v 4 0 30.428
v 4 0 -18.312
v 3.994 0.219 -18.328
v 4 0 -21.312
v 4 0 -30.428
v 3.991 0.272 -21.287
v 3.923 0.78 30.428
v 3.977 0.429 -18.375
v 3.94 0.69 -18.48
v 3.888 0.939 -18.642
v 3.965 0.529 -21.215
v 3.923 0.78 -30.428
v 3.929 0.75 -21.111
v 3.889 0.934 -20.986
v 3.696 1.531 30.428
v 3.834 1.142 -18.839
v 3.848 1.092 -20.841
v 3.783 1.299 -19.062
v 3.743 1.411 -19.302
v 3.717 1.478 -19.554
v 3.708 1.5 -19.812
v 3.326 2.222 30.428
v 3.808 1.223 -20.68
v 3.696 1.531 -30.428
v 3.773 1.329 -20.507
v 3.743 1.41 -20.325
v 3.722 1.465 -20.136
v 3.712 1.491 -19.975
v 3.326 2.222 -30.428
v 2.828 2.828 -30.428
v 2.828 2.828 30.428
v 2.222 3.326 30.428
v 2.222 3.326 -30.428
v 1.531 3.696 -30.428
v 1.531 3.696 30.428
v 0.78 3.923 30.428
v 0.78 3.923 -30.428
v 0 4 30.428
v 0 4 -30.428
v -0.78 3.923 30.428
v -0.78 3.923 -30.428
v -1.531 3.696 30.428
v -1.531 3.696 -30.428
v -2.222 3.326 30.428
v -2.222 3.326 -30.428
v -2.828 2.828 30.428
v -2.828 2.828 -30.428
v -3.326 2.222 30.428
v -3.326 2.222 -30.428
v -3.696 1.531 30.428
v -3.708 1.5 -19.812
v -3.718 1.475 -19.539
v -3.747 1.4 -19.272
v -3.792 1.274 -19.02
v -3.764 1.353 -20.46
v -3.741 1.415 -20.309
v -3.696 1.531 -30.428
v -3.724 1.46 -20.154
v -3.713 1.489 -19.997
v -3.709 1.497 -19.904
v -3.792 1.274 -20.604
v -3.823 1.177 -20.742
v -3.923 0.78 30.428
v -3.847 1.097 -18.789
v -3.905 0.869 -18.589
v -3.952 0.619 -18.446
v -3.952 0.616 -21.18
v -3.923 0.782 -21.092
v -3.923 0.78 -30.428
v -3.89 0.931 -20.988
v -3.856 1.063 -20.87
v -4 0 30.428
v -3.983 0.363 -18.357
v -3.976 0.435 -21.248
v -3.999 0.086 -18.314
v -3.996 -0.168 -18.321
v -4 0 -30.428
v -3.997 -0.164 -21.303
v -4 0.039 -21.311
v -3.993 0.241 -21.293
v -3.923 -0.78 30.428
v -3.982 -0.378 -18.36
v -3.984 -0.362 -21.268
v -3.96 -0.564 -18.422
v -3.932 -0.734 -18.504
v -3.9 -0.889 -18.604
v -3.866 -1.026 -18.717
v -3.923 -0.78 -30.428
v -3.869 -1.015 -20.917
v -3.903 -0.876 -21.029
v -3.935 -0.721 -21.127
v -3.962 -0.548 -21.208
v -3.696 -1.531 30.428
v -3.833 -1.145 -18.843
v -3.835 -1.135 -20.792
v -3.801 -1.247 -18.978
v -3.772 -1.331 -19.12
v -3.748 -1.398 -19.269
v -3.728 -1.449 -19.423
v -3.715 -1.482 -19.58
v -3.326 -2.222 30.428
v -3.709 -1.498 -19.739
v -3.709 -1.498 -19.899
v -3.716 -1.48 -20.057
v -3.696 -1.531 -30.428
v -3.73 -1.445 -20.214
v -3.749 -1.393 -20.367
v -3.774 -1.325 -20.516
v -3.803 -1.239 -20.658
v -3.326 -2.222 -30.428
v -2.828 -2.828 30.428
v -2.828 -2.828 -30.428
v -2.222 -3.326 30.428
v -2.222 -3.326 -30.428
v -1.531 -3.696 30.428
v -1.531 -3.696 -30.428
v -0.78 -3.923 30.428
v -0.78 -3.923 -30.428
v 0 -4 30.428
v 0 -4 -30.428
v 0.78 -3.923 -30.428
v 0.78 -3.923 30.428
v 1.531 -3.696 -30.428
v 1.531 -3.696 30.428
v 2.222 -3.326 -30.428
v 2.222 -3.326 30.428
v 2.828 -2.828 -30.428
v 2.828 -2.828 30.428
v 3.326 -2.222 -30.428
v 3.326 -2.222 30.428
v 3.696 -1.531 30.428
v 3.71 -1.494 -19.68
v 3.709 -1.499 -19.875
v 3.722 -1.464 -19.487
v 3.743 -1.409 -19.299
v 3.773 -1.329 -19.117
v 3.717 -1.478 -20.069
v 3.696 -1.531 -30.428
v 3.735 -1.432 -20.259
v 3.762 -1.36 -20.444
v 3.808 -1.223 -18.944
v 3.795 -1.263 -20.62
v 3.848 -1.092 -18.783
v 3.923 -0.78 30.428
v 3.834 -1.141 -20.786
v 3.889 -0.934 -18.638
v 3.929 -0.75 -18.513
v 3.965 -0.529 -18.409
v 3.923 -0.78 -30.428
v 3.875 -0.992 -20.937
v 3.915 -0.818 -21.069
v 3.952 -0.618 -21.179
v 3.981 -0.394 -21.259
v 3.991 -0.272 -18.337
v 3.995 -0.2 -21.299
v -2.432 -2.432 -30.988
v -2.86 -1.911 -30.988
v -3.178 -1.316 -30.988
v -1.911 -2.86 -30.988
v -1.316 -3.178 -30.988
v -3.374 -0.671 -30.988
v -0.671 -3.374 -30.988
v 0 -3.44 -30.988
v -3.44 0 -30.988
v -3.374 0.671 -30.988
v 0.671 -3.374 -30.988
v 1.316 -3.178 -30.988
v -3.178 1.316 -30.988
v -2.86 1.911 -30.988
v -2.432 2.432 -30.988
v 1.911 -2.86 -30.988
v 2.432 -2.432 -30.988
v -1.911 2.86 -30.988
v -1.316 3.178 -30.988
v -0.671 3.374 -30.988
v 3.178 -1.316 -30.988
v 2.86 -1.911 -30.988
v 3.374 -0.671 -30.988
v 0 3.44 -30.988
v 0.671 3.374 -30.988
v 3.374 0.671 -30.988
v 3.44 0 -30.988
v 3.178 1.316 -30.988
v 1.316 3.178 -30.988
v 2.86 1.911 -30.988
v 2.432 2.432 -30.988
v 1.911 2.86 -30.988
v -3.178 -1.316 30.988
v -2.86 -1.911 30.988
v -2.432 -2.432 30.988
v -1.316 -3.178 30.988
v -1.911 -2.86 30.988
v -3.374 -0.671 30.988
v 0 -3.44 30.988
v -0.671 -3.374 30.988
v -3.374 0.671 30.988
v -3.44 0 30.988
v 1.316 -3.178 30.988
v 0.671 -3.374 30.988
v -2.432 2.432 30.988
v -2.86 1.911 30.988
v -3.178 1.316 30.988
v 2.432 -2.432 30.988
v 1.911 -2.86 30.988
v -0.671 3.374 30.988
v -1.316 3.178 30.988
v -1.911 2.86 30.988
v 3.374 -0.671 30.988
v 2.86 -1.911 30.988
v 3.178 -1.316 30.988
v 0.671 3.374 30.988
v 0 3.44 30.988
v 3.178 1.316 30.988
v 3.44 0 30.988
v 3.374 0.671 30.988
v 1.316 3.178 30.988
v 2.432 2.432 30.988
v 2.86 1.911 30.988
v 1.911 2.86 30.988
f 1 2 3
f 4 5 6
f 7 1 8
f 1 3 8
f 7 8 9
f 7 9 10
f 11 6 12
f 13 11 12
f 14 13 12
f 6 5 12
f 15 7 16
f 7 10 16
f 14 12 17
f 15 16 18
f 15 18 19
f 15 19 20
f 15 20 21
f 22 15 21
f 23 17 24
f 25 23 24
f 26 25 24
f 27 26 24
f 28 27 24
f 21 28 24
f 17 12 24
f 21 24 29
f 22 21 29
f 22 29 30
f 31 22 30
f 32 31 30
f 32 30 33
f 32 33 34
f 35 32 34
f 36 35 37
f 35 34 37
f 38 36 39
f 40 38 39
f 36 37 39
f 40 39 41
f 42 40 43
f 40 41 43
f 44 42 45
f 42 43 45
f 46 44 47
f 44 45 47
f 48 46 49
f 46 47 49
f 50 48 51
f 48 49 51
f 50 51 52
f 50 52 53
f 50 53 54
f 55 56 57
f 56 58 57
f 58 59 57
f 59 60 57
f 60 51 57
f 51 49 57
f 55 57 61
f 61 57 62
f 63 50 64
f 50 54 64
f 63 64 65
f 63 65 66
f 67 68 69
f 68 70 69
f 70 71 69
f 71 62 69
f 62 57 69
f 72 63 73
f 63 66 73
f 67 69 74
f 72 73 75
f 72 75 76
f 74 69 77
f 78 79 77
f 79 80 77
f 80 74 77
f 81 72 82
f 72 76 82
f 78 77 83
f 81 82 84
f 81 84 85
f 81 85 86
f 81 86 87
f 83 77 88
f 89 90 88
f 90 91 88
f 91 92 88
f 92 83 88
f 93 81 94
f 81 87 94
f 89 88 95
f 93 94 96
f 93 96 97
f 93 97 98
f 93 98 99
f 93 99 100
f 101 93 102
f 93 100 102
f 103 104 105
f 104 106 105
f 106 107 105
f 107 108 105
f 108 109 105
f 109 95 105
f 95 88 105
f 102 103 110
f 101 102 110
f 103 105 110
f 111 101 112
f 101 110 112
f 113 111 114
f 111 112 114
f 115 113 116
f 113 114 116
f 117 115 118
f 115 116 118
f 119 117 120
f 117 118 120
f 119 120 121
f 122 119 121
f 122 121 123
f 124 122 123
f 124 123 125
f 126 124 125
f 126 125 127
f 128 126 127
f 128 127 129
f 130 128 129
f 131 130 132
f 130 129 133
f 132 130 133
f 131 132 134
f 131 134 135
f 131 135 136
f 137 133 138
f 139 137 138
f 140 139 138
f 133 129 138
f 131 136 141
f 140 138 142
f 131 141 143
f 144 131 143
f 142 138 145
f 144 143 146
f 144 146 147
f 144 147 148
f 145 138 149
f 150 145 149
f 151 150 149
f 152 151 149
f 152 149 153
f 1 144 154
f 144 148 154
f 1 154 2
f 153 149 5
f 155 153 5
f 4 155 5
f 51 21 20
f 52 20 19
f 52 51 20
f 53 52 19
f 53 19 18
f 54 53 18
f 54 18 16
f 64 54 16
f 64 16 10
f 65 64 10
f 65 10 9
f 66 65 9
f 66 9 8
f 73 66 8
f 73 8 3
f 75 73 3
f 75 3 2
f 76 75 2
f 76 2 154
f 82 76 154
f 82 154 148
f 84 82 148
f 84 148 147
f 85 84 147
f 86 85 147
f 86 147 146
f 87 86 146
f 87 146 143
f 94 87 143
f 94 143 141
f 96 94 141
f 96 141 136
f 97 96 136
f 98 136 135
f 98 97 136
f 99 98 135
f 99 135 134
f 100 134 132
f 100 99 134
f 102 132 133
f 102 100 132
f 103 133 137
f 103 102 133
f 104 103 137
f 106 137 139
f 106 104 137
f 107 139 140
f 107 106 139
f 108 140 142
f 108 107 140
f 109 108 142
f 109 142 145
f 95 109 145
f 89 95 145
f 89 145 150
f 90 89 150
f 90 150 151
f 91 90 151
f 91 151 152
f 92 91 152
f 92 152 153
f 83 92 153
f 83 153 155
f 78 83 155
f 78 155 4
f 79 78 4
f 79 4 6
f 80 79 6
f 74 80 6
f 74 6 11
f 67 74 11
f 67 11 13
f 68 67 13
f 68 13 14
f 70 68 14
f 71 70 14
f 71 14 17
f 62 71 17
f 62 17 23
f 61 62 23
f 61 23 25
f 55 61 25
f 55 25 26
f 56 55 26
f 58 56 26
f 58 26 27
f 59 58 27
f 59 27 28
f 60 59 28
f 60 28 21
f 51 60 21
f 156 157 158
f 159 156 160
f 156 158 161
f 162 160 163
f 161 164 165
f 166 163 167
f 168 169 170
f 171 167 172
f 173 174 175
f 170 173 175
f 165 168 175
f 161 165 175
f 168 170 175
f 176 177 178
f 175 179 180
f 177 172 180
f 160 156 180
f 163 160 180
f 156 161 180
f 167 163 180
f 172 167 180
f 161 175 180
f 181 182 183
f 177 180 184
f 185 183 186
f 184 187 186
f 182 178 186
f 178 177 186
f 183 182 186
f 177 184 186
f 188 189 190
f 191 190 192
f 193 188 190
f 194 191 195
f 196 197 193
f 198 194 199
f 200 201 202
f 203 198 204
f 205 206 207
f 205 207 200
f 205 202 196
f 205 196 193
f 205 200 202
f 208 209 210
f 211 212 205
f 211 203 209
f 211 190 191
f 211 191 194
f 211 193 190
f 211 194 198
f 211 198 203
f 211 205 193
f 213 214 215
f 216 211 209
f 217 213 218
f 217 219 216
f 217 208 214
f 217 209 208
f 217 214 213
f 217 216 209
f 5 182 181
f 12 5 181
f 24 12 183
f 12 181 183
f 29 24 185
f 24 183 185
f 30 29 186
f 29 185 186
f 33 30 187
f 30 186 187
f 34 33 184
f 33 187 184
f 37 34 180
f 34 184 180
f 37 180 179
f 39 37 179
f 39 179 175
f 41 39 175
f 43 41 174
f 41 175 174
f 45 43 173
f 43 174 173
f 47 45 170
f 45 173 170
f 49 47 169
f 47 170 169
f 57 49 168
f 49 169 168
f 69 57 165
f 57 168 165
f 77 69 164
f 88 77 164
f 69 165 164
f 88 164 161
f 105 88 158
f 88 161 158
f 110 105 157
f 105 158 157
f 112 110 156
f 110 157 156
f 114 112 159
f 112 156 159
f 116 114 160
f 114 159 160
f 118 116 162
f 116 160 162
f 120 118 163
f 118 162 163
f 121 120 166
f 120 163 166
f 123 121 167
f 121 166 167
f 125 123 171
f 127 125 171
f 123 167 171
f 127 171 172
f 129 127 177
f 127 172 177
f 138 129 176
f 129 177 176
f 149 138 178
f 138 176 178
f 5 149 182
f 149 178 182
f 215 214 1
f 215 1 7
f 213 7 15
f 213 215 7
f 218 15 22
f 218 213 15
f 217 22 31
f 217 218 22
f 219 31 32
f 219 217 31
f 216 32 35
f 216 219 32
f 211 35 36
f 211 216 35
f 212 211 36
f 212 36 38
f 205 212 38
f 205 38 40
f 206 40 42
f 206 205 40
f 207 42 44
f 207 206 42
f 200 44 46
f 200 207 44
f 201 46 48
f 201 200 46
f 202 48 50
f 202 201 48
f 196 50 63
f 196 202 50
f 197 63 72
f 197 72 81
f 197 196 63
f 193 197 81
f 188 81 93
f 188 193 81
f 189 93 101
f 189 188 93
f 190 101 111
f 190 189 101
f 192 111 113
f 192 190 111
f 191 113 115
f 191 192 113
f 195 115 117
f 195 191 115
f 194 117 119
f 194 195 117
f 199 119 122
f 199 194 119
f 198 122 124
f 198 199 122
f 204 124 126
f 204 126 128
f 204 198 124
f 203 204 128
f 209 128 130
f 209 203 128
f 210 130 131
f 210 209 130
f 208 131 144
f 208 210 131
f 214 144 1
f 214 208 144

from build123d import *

# Parameters (mm, degrees)
BOSS_EXTRUDE1_DEPTH      = 30.988
BOSS_EXTRUDE1_DEPTH_BACK = 30.988
SKETCH1_R                = 4
CUT_EXTRUDE1_START       = -4.000000101
CUT_EXTRUDE1_OUTLINE_R   = 1.500000048
CUT_EXTRUDE1_DEPTH       = 8.000000202
CHAMFER1_SIZE            = 0.56


# Read off the part's stored shape, not the designer's step: Cut-Extrude1
with BuildPart() as part:
    # Sketch1 → Boss-Extrude1 (new, two sides: drawn at the far end of the back side and taken through both)
    with BuildSketch(Plane.XY.offset(-BOSS_EXTRUDE1_DEPTH_BACK)):
        Circle(SKETCH1_R)
    extrude(amount=BOSS_EXTRUDE1_DEPTH + BOSS_EXTRUDE1_DEPTH_BACK)

    # Cut-Extrude1 outline → Cut-Extrude1 (cut)
    with BuildSketch(Plane.YZ.offset(CUT_EXTRUDE1_START)):
        with Locations((0, -19.812)):
            Circle(CUT_EXTRUDE1_OUTLINE_R)
    extrude(amount=CUT_EXTRUDE1_DEPTH, mode=Mode.SUBTRACT)

    # Chamfer1
    chamfer1_edges = [part.edges().sort_by_distance(p)[0] for p in [
        (-4, 0, -30.988),
        (-4, 0, 30.988),
    ]]
    chamfer(chamfer1_edges, length=CHAMFER1_SIZE)


solid = part.part
